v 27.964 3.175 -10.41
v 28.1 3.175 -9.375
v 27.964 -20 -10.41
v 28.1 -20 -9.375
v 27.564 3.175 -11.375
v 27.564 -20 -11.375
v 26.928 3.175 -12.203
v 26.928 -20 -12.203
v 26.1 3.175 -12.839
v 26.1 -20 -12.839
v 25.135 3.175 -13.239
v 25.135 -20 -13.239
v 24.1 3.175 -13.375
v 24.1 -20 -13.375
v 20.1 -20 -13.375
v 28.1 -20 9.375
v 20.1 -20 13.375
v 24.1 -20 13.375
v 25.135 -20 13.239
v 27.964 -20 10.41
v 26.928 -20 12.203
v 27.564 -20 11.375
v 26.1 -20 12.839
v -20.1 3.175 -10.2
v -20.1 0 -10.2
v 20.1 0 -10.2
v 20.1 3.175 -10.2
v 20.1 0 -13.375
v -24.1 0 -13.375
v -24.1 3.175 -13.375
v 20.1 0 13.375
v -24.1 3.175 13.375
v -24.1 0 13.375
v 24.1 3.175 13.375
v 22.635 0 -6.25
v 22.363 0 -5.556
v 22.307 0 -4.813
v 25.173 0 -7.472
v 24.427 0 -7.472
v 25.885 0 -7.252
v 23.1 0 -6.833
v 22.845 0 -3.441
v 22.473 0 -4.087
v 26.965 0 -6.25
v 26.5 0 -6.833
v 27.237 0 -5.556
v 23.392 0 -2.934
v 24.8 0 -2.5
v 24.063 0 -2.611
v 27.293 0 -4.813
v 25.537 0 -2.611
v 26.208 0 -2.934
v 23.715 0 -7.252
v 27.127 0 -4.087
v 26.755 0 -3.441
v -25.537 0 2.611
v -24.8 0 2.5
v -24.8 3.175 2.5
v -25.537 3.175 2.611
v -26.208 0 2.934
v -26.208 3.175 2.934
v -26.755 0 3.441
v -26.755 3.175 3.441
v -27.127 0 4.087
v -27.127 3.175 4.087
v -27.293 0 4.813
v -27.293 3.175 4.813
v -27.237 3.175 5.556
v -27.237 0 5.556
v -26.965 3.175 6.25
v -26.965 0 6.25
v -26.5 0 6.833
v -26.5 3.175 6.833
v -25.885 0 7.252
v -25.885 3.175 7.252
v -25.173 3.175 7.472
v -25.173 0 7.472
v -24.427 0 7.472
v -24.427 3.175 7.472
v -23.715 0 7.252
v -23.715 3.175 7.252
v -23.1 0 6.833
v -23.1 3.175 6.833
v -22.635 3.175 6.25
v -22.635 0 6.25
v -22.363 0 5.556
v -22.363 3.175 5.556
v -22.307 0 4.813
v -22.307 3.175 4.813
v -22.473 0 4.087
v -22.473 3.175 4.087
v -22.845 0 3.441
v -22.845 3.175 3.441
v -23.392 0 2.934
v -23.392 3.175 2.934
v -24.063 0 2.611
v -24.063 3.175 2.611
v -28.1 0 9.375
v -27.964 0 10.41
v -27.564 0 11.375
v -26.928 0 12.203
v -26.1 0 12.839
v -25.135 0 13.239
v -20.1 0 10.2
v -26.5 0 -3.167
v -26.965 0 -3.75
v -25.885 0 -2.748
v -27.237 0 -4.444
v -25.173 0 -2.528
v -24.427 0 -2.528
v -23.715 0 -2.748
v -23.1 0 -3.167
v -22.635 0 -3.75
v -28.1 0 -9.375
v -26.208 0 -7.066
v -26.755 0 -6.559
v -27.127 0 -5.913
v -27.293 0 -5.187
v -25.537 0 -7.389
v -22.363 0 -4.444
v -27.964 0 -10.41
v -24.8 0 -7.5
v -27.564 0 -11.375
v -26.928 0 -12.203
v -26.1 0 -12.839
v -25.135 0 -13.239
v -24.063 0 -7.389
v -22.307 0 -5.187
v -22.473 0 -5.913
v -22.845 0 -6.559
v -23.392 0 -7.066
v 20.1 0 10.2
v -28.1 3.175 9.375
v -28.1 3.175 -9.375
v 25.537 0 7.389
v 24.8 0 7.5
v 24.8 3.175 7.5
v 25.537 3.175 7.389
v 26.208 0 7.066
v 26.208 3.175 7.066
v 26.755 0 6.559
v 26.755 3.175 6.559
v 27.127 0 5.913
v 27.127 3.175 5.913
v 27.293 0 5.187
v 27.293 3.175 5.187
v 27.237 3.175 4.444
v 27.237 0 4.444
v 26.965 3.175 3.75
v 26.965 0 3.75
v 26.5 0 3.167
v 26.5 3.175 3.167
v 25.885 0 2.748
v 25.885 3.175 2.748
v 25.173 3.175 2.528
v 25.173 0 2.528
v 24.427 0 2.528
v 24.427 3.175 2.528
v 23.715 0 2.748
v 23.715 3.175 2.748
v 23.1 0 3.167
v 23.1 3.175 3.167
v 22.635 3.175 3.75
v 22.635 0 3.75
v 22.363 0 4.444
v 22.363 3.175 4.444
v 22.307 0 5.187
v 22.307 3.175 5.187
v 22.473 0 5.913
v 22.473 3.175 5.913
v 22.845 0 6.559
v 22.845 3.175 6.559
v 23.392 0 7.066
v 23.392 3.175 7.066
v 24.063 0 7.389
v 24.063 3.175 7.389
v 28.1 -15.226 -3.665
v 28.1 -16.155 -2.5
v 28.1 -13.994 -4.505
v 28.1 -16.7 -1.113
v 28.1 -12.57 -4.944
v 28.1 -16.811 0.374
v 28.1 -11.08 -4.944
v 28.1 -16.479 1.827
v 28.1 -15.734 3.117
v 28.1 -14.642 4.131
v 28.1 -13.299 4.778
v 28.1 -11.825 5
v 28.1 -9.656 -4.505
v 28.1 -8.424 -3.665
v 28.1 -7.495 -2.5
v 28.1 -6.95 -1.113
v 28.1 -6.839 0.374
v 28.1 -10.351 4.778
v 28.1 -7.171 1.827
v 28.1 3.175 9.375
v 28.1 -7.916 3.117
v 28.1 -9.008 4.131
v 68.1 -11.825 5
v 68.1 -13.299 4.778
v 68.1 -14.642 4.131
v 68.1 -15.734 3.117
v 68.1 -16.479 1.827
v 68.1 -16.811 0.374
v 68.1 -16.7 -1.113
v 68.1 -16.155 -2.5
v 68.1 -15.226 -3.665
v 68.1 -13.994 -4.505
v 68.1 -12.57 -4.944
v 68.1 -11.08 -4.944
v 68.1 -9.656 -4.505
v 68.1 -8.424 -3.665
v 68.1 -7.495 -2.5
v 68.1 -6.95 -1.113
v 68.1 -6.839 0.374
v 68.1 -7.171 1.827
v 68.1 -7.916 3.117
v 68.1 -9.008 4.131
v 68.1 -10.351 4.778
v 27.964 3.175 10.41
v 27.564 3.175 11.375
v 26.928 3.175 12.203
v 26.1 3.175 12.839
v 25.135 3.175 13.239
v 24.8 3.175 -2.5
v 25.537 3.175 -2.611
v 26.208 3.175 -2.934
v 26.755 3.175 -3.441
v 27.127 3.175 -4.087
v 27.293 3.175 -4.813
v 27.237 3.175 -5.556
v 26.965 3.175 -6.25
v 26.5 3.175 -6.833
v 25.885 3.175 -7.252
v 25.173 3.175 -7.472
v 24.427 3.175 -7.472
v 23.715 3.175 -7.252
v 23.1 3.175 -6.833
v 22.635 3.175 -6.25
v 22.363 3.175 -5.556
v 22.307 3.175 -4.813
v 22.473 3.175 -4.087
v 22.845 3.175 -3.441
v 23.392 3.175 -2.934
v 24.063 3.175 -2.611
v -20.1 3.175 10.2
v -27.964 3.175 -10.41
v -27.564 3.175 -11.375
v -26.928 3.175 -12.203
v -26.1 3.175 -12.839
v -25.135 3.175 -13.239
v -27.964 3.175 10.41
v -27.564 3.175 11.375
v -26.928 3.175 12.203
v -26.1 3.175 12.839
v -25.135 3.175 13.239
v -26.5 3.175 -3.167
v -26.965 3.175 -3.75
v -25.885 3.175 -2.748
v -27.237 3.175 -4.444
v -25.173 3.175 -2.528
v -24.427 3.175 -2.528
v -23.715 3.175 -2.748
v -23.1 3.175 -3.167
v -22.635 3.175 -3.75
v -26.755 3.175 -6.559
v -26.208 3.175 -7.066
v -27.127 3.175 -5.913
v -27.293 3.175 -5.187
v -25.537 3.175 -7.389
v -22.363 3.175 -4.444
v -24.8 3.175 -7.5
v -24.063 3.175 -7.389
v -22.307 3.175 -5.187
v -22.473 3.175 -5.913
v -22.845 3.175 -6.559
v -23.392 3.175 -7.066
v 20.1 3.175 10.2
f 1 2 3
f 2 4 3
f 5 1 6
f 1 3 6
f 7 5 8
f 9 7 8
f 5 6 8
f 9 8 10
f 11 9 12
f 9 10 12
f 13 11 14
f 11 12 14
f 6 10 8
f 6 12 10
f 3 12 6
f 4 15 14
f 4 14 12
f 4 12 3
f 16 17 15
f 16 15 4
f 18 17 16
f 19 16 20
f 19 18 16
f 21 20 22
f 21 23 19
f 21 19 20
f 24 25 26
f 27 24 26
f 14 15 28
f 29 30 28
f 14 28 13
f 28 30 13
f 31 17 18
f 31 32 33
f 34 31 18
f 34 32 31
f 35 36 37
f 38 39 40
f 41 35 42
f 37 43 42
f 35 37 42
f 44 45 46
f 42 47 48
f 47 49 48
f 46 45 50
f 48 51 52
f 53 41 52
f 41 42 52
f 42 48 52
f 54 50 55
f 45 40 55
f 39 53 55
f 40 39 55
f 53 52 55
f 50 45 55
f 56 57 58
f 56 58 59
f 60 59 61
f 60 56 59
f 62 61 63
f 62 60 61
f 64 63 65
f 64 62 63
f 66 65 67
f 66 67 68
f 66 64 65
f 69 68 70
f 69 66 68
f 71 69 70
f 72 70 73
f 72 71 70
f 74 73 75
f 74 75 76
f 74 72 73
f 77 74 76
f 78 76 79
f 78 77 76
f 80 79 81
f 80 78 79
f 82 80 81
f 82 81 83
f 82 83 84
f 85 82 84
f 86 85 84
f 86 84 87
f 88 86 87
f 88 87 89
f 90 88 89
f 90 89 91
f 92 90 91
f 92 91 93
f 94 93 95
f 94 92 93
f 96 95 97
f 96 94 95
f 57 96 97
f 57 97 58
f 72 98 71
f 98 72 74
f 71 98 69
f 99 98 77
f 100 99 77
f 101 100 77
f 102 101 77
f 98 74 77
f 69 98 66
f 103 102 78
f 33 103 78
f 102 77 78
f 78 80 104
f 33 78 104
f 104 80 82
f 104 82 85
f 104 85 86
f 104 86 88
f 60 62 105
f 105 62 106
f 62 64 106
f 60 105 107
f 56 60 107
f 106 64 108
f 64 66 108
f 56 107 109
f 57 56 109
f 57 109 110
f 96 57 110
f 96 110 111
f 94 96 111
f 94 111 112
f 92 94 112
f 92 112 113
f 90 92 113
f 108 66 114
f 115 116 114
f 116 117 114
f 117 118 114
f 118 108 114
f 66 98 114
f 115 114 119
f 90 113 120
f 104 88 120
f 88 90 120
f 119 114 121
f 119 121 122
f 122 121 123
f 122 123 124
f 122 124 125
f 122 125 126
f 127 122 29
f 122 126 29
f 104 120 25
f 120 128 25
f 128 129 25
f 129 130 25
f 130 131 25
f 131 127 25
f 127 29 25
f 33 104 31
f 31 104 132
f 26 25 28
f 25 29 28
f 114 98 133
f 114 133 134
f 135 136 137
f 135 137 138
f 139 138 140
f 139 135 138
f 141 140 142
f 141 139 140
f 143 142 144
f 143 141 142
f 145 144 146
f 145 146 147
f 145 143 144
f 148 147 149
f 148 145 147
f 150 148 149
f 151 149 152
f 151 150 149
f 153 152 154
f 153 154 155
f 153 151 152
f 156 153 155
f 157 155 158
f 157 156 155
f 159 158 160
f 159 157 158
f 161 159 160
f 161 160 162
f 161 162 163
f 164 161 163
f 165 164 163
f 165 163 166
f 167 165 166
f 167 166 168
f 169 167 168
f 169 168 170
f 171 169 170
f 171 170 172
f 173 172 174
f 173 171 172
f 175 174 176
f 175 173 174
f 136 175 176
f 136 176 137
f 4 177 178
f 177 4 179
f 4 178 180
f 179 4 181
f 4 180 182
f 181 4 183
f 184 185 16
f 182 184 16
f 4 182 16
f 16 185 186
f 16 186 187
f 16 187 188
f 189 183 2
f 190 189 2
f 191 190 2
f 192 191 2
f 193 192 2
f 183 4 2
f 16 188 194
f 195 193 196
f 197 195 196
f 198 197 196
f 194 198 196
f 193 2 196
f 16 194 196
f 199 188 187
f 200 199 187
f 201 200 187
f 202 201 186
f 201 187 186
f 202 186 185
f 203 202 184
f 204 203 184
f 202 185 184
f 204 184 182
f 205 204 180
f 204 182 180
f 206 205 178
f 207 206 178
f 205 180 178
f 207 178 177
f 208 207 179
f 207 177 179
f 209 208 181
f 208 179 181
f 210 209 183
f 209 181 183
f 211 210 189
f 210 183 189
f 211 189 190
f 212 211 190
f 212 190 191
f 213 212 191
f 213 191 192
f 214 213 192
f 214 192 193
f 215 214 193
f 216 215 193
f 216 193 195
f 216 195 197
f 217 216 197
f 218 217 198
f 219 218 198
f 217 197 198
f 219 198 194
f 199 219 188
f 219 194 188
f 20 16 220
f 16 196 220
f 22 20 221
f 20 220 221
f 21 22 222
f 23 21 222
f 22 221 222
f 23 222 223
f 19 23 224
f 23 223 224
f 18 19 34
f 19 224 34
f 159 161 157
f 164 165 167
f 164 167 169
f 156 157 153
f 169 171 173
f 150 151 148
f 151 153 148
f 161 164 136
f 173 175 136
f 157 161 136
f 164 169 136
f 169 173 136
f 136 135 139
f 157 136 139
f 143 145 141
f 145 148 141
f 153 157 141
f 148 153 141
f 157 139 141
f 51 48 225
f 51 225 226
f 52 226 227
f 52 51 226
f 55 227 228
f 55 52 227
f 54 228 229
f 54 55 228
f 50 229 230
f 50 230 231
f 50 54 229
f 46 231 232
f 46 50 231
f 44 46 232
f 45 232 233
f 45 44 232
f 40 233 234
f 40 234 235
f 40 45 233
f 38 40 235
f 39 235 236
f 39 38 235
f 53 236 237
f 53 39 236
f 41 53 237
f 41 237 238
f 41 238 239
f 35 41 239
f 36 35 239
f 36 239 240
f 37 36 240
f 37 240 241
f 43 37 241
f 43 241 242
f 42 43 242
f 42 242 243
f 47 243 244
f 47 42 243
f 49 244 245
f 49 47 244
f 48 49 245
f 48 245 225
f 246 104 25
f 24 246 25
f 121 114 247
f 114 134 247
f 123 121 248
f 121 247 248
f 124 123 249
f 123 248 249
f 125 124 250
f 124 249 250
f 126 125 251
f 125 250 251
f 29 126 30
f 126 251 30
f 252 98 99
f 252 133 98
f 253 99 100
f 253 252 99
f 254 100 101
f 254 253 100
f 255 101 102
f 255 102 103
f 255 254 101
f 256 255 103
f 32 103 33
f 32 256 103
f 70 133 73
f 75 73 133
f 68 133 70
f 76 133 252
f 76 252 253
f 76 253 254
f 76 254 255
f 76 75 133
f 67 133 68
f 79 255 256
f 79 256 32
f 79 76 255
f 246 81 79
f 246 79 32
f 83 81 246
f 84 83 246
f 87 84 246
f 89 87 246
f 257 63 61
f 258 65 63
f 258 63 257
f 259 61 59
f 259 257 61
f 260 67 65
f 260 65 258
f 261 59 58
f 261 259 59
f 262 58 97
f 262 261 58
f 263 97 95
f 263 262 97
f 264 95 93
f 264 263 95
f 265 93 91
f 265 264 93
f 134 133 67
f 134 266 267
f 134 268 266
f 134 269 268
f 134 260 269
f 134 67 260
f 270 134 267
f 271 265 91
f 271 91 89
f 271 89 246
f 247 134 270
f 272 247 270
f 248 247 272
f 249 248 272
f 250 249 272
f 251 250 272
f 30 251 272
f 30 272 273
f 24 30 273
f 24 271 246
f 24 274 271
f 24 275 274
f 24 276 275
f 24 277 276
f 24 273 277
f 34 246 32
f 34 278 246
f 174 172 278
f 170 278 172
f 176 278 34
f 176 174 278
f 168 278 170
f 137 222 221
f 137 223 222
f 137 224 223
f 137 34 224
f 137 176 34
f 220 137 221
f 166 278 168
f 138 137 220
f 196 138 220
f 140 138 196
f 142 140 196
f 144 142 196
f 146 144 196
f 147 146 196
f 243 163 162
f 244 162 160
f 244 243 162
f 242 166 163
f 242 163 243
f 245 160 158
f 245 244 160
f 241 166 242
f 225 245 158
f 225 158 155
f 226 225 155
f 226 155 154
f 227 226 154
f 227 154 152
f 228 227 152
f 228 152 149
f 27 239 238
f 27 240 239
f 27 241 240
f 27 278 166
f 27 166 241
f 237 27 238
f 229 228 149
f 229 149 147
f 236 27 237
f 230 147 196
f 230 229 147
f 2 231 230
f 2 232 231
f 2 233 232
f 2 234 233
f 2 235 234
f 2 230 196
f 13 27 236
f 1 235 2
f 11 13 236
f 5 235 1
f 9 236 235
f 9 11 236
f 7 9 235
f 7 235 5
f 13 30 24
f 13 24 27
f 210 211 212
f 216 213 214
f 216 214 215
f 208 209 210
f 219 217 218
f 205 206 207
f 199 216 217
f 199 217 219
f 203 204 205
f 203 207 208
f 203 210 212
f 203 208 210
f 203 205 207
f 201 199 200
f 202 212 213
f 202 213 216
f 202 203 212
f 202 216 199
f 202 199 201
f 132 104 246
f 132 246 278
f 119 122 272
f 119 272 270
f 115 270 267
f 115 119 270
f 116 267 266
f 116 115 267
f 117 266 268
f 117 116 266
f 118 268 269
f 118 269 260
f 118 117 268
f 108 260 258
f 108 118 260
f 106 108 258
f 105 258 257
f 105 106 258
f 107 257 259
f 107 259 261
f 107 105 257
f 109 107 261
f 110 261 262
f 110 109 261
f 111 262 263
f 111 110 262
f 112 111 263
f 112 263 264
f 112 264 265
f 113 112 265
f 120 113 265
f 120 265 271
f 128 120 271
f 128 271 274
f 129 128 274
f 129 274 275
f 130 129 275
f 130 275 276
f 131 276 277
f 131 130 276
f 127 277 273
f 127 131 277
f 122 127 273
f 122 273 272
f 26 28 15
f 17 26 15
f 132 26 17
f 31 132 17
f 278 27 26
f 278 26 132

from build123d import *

# Parameters (mm, degrees)
SKETCH1_W           = 56.2
SKETCH1_H           = 26.75
SKETCH1_R           = 2.5
SKETCH1_W_2         = 40.2
SKETCH1_H_2         = 20.4
BOSS_EXTRUDE1_DEPTH = 3.175
SKETCH3_W           = 8
SKETCH3_H           = 26.75
BOSS_EXTRUDE2_DEPTH = 20
FILLET1_R           = 4
SKETCH4_R           = 5
BOSS_EXTRUDE3_DEPTH = 40


with BuildPart() as part:
    # Sketch1 → Boss-Extrude1 (new body)
    with BuildSketch(Plane(origin=(0, 0, 0), x_dir=(1, 0, 0), z_dir=(0, 1, 0))):
        Rectangle(SKETCH1_W, SKETCH1_H)
        with Locations(Location((24.8, 5, 0), (0, 0, 270))):
            Circle(SKETCH1_R, mode=Mode.SUBTRACT)
        with Locations(Location((24.8, -5, 0), (0, 0, 270))):
            Circle(SKETCH1_R, mode=Mode.SUBTRACT)
        with Locations(Location((-24.8, -5, 0), (0, 0, 90))):
            Circle(SKETCH1_R, mode=Mode.SUBTRACT)
        with Locations(Location((-24.8, 5, 0), (0, 0, 90))):
            Circle(SKETCH1_R, mode=Mode.SUBTRACT)
        Rectangle(SKETCH1_W_2, SKETCH1_H_2, mode=Mode.SUBTRACT)
    extrude(amount=BOSS_EXTRUDE1_DEPTH)

    # Sketch3 → Boss-Extrude2 (add)
    with BuildSketch(Plane.XZ):
        with Locations((24.1, 0)):
            Rectangle(SKETCH3_W, SKETCH3_H)
    extrude(amount=BOSS_EXTRUDE2_DEPTH)

    # Fillet1
    fillet1_edges = [part.edges().sort_by_distance(p)[0] for p in [
        (28.1, -8.4125, 13.375),
        (-28.1, 1.5875, 13.375),
        (-28.1, 1.5875, -13.375),
        (28.1, -8.4125, -13.375),
    ]]
    fillet(fillet1_edges, radius=FILLET1_R)

    # Sketch4 → Boss-Extrude3 (add)
    with BuildSketch(Plane(origin=(28.1, 0, 0), x_dir=(0, 0, -1), z_dir=(1, 0, 0))):
        with Locations(Location((0, -11.825, 0), (0, 0, 180))):
            Circle(SKETCH4_R)
    extrude(amount=BOSS_EXTRUDE3_DEPTH)


solid = part.part
